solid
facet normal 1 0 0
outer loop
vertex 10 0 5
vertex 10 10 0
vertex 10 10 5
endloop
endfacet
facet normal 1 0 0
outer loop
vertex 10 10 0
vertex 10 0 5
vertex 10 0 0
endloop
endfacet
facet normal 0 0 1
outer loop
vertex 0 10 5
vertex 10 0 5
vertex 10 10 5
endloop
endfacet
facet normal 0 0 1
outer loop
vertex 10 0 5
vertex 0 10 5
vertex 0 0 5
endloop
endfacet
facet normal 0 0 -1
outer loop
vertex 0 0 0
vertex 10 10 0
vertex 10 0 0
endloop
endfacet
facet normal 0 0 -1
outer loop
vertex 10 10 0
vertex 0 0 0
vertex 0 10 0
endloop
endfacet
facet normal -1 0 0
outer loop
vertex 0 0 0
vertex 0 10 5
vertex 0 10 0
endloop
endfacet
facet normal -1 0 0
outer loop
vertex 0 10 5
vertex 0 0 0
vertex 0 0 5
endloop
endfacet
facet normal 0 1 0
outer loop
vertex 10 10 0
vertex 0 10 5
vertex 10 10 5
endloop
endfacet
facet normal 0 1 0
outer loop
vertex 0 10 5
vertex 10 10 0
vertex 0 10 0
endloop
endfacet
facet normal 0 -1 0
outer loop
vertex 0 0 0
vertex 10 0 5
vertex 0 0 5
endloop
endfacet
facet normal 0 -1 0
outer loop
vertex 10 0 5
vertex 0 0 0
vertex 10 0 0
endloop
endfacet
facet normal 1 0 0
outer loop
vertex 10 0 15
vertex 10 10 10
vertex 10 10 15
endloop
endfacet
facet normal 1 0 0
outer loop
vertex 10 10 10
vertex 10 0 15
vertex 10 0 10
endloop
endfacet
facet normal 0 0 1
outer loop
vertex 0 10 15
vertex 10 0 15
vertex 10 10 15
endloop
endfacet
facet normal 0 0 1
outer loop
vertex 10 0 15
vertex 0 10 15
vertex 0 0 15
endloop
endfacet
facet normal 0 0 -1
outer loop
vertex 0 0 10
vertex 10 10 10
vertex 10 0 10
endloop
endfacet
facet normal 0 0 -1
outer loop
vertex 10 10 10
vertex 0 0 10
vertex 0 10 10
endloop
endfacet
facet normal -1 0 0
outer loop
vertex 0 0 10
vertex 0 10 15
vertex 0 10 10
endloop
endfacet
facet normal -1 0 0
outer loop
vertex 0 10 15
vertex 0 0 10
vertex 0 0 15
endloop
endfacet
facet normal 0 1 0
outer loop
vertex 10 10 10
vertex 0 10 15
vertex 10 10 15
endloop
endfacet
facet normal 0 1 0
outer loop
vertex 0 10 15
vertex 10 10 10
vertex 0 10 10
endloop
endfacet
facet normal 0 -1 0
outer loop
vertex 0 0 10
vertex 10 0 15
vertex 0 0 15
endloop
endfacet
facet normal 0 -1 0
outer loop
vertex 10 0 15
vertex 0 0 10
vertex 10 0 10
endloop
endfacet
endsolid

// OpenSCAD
cube(size=[10, 10, 5]);
translate([0, 0, 10])
cube(size=[10, 10, 5]);
